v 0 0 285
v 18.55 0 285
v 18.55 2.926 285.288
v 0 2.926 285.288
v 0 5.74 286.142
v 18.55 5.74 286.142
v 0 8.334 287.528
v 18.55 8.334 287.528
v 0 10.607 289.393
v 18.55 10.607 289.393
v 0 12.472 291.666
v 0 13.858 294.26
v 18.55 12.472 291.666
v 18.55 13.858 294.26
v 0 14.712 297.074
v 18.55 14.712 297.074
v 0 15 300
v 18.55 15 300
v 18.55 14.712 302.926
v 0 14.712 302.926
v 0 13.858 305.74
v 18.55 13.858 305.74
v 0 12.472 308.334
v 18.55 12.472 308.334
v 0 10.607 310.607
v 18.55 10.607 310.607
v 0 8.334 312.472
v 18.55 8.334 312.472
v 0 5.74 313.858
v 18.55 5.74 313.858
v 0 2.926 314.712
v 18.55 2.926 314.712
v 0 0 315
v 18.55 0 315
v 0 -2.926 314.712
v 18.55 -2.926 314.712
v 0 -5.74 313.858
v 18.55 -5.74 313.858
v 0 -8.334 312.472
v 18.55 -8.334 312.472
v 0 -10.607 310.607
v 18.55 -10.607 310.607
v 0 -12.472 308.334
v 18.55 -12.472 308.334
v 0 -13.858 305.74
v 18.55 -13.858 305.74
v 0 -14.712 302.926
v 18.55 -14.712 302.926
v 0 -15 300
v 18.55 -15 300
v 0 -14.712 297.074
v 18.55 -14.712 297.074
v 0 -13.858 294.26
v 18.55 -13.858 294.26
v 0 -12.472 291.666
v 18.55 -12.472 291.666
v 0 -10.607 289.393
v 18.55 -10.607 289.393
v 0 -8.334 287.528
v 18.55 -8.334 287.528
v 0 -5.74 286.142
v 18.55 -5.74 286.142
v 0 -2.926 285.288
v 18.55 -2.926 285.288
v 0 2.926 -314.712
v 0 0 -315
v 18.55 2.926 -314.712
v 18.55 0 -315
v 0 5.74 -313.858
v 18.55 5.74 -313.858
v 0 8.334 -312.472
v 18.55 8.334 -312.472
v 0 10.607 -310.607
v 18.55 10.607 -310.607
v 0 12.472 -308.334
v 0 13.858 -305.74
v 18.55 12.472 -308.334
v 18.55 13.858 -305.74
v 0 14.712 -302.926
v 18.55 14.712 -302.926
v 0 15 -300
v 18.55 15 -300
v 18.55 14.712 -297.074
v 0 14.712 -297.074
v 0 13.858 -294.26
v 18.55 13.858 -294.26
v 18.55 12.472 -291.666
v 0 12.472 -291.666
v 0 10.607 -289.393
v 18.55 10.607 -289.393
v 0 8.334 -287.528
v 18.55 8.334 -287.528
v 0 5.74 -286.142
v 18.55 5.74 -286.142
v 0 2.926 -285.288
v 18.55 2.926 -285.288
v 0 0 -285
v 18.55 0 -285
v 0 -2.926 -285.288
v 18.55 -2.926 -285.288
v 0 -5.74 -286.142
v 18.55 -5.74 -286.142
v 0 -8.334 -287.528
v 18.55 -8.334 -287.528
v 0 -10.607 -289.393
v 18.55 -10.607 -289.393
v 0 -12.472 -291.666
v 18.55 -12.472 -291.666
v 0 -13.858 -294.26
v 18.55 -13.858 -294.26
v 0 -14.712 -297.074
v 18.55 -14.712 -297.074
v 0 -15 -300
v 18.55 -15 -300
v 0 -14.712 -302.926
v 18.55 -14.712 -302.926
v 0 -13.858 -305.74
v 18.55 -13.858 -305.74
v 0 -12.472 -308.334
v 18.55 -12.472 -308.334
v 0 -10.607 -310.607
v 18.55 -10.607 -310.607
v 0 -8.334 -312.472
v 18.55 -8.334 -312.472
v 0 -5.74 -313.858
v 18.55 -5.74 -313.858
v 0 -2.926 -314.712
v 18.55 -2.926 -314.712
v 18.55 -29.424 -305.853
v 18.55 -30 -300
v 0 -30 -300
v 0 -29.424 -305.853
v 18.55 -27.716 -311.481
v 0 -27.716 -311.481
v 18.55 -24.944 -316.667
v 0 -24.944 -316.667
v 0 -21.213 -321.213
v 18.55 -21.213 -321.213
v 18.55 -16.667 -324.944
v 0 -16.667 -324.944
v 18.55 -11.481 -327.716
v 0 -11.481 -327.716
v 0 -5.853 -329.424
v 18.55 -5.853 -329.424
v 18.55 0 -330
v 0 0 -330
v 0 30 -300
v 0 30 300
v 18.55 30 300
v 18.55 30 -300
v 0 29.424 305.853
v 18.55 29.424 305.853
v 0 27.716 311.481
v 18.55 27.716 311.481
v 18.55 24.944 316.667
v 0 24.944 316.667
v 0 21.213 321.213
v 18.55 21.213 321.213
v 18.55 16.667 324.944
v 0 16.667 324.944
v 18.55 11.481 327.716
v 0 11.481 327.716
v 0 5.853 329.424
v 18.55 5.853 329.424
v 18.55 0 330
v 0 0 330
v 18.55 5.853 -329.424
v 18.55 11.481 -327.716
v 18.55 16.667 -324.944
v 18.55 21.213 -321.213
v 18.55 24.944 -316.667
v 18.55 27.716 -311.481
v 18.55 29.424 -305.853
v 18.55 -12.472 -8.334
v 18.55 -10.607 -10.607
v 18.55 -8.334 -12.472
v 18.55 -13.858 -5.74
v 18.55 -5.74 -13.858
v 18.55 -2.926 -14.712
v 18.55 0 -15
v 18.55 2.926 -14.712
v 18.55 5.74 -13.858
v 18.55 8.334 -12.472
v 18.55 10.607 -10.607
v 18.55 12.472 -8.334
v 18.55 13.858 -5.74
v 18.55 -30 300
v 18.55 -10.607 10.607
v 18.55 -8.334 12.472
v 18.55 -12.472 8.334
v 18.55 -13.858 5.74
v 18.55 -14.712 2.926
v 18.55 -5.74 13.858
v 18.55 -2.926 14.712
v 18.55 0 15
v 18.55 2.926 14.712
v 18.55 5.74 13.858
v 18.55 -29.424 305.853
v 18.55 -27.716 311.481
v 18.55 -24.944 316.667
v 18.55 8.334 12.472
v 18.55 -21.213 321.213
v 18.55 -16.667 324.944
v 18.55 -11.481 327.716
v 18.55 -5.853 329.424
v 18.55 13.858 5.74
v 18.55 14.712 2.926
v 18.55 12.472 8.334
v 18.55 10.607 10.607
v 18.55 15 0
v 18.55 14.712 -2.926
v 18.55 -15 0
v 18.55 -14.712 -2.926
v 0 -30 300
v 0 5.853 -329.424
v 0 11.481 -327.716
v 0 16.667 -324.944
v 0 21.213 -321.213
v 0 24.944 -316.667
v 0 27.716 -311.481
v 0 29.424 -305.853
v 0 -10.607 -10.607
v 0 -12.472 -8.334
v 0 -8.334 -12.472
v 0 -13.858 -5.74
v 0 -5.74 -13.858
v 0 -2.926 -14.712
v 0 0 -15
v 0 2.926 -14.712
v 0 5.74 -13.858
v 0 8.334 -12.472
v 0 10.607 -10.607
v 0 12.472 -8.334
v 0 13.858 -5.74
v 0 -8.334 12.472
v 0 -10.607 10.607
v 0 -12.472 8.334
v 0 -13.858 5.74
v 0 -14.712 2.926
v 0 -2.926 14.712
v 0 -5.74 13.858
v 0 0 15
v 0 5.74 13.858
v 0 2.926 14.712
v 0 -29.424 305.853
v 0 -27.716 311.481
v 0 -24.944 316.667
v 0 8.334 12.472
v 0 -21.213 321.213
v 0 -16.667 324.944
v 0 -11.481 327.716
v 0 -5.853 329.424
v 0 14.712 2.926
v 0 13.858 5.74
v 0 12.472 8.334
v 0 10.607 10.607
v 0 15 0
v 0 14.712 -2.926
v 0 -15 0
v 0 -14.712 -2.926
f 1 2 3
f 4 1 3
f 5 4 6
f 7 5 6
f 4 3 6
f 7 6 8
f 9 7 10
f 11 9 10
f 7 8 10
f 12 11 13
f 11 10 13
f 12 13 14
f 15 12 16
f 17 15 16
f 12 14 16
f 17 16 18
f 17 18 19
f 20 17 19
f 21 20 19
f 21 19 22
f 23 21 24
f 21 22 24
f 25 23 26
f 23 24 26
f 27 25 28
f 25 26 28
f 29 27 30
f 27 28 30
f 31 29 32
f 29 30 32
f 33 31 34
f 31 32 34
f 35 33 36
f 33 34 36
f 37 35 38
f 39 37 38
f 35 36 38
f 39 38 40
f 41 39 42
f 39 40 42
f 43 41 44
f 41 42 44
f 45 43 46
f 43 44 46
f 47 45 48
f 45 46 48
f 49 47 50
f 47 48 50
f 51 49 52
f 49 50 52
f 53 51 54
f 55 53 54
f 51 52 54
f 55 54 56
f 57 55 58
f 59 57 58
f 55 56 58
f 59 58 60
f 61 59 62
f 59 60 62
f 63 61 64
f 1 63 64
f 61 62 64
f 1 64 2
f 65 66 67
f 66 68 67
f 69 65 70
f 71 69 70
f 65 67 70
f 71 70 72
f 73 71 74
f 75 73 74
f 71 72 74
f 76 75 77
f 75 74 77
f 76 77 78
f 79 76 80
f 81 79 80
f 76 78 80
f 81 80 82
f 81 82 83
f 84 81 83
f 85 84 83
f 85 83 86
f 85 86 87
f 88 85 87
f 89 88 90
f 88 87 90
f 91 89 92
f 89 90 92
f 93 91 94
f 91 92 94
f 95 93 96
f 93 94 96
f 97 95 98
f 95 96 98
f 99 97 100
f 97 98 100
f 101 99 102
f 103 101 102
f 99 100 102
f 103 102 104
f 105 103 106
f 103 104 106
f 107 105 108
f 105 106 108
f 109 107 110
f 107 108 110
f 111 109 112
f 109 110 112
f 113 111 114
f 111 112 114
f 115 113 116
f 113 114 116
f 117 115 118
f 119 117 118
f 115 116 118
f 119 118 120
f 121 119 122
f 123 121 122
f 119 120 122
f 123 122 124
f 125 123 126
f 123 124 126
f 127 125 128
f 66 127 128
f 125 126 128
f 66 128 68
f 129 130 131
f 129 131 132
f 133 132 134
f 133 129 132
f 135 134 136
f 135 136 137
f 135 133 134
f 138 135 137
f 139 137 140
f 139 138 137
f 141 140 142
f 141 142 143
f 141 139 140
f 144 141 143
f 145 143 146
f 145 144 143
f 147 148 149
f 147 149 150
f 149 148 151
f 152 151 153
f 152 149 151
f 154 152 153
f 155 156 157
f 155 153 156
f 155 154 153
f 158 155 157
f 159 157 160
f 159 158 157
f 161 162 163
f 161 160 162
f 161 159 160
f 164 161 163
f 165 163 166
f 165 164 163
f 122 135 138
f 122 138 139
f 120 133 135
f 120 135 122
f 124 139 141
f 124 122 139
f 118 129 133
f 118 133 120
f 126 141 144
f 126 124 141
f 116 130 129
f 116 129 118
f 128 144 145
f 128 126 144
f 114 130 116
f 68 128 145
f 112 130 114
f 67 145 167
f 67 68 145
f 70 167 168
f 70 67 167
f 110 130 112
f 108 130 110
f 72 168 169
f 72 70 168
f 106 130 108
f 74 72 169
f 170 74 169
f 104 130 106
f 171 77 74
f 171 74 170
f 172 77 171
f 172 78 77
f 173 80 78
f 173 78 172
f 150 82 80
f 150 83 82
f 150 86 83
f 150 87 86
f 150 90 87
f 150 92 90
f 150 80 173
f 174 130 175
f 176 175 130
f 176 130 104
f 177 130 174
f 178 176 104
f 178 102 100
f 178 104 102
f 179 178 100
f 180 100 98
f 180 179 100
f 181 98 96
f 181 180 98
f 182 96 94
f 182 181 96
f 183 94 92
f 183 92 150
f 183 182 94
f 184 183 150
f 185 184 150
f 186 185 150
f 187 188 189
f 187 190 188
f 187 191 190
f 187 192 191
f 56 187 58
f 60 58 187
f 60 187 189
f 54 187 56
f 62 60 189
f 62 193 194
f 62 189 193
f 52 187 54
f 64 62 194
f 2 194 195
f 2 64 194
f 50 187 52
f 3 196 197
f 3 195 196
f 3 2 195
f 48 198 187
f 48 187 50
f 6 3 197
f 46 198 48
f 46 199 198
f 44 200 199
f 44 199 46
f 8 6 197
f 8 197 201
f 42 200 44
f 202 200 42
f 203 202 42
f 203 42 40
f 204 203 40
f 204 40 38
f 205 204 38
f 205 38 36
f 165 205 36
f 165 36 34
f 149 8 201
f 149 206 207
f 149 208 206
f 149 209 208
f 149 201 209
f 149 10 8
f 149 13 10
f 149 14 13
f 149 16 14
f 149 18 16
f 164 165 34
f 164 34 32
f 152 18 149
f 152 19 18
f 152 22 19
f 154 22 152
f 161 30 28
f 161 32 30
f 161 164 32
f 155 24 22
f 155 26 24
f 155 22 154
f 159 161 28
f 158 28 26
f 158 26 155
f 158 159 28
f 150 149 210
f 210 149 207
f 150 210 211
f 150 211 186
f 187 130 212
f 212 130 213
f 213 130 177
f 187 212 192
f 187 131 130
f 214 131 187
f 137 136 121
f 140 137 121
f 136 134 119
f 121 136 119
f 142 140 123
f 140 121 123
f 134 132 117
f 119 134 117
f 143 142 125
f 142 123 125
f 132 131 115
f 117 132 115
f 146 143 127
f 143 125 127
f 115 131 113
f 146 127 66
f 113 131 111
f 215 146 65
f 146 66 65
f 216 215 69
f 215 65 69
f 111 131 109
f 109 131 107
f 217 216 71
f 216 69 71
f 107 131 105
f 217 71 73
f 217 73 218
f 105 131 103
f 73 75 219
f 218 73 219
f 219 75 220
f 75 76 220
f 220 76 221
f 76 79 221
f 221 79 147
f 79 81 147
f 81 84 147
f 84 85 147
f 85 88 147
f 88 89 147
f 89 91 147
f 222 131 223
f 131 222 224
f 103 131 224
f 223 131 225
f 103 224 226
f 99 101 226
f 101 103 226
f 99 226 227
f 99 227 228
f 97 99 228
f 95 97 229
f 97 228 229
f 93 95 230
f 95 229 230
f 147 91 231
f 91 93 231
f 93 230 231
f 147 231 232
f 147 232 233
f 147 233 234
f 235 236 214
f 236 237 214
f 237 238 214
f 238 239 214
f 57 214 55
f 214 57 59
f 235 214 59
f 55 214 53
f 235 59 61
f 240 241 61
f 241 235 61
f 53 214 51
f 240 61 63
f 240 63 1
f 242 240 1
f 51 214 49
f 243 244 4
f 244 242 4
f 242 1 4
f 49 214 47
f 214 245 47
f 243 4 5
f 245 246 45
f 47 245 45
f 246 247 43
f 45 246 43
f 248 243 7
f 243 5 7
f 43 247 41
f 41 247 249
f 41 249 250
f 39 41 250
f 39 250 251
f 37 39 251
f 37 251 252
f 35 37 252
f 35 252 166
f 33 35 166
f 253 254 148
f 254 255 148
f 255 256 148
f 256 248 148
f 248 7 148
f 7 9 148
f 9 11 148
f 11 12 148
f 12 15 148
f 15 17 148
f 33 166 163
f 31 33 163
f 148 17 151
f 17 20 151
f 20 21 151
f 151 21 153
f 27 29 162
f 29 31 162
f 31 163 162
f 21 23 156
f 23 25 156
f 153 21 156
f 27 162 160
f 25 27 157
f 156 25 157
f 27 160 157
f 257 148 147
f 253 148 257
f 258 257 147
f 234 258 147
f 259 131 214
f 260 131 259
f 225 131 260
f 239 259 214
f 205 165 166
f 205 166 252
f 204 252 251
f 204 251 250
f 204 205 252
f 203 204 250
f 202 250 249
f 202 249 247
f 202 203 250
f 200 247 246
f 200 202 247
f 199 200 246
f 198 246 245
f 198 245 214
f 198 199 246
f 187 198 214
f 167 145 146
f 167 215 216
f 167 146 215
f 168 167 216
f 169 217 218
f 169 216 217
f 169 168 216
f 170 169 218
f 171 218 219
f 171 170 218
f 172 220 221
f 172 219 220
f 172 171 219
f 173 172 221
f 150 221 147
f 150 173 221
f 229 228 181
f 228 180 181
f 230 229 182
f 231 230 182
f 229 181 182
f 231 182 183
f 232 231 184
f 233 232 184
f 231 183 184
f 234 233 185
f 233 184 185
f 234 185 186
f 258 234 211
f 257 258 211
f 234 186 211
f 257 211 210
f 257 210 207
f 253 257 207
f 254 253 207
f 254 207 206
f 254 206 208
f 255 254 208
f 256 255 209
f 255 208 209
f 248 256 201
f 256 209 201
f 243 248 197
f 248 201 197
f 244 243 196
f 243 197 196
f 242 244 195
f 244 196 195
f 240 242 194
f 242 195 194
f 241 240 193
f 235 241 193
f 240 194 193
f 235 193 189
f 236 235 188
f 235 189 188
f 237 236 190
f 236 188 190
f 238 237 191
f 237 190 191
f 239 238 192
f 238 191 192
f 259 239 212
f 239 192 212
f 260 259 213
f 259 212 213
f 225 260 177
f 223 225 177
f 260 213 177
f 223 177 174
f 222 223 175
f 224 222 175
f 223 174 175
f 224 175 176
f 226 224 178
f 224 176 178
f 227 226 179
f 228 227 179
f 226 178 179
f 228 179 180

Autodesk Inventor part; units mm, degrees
ref_plane "YZ Plane" through (0, 0, 0) normal (1, 0, 0) x (0, 1, 0)
ref_plane "XZ Plane" through (0, 0, 0) normal (0, 1, 0) x (-1, 0, 0)
ref_plane "XY Plane" through (0, 0, 0) normal (0, 0, 1) x (1, 0, 0)
sketch "Esquisse1" plane through (0, 0, 0) normal (1, 0, 0) x (0, 1, 0)
  line L0 (-30, 330) -> (30, 330)
  line L1 (30, 330) -> (30, -330)
  line L2 (30, -330) -> (-30, -330)
  line L3 (-30, -330) -> (-30, 330)
  line L4 (-30, 330) -> (30, -330) construction
  line L5 (30, 330) -> (-30, -330) construction
  point P0 (0, 0)
  dimension "d0" = 660
  dimension "d1" = 60
extrude "Extrusion1" add sketch "Esquisse1" along normal blind 18.55
sketch "Esquisse2" plane through (18.55, 0, 0) normal (1, 0, 0) x (0, 0, -1)
  circle A0 centre (-300, 0) radius 15
  circle A1 centre (0, 0) radius 15
  circle A2 centre (300, 0) radius 15
  line L0 (330, -30) -> (330, 30) projected
  line L1 (-330, 30) -> (-330, -30) projected
  line L2 (-330, 0) -> (330, 0) construction
  dimension "d4" = 30
  dimension "d5" = 30
  dimension "d6" = 30
extrude "Extrusion2" cut sketch "Esquisse2" against normal blind 18.55
fillet "Congé1" radius 30 1 edges at (9.275, 30, 330)
fillet "Congé2" radius 30 3 edges at (9.275, -30, 330) (9.275, 30, -330) (9.275, -30, -330)
properties part number "foot"
